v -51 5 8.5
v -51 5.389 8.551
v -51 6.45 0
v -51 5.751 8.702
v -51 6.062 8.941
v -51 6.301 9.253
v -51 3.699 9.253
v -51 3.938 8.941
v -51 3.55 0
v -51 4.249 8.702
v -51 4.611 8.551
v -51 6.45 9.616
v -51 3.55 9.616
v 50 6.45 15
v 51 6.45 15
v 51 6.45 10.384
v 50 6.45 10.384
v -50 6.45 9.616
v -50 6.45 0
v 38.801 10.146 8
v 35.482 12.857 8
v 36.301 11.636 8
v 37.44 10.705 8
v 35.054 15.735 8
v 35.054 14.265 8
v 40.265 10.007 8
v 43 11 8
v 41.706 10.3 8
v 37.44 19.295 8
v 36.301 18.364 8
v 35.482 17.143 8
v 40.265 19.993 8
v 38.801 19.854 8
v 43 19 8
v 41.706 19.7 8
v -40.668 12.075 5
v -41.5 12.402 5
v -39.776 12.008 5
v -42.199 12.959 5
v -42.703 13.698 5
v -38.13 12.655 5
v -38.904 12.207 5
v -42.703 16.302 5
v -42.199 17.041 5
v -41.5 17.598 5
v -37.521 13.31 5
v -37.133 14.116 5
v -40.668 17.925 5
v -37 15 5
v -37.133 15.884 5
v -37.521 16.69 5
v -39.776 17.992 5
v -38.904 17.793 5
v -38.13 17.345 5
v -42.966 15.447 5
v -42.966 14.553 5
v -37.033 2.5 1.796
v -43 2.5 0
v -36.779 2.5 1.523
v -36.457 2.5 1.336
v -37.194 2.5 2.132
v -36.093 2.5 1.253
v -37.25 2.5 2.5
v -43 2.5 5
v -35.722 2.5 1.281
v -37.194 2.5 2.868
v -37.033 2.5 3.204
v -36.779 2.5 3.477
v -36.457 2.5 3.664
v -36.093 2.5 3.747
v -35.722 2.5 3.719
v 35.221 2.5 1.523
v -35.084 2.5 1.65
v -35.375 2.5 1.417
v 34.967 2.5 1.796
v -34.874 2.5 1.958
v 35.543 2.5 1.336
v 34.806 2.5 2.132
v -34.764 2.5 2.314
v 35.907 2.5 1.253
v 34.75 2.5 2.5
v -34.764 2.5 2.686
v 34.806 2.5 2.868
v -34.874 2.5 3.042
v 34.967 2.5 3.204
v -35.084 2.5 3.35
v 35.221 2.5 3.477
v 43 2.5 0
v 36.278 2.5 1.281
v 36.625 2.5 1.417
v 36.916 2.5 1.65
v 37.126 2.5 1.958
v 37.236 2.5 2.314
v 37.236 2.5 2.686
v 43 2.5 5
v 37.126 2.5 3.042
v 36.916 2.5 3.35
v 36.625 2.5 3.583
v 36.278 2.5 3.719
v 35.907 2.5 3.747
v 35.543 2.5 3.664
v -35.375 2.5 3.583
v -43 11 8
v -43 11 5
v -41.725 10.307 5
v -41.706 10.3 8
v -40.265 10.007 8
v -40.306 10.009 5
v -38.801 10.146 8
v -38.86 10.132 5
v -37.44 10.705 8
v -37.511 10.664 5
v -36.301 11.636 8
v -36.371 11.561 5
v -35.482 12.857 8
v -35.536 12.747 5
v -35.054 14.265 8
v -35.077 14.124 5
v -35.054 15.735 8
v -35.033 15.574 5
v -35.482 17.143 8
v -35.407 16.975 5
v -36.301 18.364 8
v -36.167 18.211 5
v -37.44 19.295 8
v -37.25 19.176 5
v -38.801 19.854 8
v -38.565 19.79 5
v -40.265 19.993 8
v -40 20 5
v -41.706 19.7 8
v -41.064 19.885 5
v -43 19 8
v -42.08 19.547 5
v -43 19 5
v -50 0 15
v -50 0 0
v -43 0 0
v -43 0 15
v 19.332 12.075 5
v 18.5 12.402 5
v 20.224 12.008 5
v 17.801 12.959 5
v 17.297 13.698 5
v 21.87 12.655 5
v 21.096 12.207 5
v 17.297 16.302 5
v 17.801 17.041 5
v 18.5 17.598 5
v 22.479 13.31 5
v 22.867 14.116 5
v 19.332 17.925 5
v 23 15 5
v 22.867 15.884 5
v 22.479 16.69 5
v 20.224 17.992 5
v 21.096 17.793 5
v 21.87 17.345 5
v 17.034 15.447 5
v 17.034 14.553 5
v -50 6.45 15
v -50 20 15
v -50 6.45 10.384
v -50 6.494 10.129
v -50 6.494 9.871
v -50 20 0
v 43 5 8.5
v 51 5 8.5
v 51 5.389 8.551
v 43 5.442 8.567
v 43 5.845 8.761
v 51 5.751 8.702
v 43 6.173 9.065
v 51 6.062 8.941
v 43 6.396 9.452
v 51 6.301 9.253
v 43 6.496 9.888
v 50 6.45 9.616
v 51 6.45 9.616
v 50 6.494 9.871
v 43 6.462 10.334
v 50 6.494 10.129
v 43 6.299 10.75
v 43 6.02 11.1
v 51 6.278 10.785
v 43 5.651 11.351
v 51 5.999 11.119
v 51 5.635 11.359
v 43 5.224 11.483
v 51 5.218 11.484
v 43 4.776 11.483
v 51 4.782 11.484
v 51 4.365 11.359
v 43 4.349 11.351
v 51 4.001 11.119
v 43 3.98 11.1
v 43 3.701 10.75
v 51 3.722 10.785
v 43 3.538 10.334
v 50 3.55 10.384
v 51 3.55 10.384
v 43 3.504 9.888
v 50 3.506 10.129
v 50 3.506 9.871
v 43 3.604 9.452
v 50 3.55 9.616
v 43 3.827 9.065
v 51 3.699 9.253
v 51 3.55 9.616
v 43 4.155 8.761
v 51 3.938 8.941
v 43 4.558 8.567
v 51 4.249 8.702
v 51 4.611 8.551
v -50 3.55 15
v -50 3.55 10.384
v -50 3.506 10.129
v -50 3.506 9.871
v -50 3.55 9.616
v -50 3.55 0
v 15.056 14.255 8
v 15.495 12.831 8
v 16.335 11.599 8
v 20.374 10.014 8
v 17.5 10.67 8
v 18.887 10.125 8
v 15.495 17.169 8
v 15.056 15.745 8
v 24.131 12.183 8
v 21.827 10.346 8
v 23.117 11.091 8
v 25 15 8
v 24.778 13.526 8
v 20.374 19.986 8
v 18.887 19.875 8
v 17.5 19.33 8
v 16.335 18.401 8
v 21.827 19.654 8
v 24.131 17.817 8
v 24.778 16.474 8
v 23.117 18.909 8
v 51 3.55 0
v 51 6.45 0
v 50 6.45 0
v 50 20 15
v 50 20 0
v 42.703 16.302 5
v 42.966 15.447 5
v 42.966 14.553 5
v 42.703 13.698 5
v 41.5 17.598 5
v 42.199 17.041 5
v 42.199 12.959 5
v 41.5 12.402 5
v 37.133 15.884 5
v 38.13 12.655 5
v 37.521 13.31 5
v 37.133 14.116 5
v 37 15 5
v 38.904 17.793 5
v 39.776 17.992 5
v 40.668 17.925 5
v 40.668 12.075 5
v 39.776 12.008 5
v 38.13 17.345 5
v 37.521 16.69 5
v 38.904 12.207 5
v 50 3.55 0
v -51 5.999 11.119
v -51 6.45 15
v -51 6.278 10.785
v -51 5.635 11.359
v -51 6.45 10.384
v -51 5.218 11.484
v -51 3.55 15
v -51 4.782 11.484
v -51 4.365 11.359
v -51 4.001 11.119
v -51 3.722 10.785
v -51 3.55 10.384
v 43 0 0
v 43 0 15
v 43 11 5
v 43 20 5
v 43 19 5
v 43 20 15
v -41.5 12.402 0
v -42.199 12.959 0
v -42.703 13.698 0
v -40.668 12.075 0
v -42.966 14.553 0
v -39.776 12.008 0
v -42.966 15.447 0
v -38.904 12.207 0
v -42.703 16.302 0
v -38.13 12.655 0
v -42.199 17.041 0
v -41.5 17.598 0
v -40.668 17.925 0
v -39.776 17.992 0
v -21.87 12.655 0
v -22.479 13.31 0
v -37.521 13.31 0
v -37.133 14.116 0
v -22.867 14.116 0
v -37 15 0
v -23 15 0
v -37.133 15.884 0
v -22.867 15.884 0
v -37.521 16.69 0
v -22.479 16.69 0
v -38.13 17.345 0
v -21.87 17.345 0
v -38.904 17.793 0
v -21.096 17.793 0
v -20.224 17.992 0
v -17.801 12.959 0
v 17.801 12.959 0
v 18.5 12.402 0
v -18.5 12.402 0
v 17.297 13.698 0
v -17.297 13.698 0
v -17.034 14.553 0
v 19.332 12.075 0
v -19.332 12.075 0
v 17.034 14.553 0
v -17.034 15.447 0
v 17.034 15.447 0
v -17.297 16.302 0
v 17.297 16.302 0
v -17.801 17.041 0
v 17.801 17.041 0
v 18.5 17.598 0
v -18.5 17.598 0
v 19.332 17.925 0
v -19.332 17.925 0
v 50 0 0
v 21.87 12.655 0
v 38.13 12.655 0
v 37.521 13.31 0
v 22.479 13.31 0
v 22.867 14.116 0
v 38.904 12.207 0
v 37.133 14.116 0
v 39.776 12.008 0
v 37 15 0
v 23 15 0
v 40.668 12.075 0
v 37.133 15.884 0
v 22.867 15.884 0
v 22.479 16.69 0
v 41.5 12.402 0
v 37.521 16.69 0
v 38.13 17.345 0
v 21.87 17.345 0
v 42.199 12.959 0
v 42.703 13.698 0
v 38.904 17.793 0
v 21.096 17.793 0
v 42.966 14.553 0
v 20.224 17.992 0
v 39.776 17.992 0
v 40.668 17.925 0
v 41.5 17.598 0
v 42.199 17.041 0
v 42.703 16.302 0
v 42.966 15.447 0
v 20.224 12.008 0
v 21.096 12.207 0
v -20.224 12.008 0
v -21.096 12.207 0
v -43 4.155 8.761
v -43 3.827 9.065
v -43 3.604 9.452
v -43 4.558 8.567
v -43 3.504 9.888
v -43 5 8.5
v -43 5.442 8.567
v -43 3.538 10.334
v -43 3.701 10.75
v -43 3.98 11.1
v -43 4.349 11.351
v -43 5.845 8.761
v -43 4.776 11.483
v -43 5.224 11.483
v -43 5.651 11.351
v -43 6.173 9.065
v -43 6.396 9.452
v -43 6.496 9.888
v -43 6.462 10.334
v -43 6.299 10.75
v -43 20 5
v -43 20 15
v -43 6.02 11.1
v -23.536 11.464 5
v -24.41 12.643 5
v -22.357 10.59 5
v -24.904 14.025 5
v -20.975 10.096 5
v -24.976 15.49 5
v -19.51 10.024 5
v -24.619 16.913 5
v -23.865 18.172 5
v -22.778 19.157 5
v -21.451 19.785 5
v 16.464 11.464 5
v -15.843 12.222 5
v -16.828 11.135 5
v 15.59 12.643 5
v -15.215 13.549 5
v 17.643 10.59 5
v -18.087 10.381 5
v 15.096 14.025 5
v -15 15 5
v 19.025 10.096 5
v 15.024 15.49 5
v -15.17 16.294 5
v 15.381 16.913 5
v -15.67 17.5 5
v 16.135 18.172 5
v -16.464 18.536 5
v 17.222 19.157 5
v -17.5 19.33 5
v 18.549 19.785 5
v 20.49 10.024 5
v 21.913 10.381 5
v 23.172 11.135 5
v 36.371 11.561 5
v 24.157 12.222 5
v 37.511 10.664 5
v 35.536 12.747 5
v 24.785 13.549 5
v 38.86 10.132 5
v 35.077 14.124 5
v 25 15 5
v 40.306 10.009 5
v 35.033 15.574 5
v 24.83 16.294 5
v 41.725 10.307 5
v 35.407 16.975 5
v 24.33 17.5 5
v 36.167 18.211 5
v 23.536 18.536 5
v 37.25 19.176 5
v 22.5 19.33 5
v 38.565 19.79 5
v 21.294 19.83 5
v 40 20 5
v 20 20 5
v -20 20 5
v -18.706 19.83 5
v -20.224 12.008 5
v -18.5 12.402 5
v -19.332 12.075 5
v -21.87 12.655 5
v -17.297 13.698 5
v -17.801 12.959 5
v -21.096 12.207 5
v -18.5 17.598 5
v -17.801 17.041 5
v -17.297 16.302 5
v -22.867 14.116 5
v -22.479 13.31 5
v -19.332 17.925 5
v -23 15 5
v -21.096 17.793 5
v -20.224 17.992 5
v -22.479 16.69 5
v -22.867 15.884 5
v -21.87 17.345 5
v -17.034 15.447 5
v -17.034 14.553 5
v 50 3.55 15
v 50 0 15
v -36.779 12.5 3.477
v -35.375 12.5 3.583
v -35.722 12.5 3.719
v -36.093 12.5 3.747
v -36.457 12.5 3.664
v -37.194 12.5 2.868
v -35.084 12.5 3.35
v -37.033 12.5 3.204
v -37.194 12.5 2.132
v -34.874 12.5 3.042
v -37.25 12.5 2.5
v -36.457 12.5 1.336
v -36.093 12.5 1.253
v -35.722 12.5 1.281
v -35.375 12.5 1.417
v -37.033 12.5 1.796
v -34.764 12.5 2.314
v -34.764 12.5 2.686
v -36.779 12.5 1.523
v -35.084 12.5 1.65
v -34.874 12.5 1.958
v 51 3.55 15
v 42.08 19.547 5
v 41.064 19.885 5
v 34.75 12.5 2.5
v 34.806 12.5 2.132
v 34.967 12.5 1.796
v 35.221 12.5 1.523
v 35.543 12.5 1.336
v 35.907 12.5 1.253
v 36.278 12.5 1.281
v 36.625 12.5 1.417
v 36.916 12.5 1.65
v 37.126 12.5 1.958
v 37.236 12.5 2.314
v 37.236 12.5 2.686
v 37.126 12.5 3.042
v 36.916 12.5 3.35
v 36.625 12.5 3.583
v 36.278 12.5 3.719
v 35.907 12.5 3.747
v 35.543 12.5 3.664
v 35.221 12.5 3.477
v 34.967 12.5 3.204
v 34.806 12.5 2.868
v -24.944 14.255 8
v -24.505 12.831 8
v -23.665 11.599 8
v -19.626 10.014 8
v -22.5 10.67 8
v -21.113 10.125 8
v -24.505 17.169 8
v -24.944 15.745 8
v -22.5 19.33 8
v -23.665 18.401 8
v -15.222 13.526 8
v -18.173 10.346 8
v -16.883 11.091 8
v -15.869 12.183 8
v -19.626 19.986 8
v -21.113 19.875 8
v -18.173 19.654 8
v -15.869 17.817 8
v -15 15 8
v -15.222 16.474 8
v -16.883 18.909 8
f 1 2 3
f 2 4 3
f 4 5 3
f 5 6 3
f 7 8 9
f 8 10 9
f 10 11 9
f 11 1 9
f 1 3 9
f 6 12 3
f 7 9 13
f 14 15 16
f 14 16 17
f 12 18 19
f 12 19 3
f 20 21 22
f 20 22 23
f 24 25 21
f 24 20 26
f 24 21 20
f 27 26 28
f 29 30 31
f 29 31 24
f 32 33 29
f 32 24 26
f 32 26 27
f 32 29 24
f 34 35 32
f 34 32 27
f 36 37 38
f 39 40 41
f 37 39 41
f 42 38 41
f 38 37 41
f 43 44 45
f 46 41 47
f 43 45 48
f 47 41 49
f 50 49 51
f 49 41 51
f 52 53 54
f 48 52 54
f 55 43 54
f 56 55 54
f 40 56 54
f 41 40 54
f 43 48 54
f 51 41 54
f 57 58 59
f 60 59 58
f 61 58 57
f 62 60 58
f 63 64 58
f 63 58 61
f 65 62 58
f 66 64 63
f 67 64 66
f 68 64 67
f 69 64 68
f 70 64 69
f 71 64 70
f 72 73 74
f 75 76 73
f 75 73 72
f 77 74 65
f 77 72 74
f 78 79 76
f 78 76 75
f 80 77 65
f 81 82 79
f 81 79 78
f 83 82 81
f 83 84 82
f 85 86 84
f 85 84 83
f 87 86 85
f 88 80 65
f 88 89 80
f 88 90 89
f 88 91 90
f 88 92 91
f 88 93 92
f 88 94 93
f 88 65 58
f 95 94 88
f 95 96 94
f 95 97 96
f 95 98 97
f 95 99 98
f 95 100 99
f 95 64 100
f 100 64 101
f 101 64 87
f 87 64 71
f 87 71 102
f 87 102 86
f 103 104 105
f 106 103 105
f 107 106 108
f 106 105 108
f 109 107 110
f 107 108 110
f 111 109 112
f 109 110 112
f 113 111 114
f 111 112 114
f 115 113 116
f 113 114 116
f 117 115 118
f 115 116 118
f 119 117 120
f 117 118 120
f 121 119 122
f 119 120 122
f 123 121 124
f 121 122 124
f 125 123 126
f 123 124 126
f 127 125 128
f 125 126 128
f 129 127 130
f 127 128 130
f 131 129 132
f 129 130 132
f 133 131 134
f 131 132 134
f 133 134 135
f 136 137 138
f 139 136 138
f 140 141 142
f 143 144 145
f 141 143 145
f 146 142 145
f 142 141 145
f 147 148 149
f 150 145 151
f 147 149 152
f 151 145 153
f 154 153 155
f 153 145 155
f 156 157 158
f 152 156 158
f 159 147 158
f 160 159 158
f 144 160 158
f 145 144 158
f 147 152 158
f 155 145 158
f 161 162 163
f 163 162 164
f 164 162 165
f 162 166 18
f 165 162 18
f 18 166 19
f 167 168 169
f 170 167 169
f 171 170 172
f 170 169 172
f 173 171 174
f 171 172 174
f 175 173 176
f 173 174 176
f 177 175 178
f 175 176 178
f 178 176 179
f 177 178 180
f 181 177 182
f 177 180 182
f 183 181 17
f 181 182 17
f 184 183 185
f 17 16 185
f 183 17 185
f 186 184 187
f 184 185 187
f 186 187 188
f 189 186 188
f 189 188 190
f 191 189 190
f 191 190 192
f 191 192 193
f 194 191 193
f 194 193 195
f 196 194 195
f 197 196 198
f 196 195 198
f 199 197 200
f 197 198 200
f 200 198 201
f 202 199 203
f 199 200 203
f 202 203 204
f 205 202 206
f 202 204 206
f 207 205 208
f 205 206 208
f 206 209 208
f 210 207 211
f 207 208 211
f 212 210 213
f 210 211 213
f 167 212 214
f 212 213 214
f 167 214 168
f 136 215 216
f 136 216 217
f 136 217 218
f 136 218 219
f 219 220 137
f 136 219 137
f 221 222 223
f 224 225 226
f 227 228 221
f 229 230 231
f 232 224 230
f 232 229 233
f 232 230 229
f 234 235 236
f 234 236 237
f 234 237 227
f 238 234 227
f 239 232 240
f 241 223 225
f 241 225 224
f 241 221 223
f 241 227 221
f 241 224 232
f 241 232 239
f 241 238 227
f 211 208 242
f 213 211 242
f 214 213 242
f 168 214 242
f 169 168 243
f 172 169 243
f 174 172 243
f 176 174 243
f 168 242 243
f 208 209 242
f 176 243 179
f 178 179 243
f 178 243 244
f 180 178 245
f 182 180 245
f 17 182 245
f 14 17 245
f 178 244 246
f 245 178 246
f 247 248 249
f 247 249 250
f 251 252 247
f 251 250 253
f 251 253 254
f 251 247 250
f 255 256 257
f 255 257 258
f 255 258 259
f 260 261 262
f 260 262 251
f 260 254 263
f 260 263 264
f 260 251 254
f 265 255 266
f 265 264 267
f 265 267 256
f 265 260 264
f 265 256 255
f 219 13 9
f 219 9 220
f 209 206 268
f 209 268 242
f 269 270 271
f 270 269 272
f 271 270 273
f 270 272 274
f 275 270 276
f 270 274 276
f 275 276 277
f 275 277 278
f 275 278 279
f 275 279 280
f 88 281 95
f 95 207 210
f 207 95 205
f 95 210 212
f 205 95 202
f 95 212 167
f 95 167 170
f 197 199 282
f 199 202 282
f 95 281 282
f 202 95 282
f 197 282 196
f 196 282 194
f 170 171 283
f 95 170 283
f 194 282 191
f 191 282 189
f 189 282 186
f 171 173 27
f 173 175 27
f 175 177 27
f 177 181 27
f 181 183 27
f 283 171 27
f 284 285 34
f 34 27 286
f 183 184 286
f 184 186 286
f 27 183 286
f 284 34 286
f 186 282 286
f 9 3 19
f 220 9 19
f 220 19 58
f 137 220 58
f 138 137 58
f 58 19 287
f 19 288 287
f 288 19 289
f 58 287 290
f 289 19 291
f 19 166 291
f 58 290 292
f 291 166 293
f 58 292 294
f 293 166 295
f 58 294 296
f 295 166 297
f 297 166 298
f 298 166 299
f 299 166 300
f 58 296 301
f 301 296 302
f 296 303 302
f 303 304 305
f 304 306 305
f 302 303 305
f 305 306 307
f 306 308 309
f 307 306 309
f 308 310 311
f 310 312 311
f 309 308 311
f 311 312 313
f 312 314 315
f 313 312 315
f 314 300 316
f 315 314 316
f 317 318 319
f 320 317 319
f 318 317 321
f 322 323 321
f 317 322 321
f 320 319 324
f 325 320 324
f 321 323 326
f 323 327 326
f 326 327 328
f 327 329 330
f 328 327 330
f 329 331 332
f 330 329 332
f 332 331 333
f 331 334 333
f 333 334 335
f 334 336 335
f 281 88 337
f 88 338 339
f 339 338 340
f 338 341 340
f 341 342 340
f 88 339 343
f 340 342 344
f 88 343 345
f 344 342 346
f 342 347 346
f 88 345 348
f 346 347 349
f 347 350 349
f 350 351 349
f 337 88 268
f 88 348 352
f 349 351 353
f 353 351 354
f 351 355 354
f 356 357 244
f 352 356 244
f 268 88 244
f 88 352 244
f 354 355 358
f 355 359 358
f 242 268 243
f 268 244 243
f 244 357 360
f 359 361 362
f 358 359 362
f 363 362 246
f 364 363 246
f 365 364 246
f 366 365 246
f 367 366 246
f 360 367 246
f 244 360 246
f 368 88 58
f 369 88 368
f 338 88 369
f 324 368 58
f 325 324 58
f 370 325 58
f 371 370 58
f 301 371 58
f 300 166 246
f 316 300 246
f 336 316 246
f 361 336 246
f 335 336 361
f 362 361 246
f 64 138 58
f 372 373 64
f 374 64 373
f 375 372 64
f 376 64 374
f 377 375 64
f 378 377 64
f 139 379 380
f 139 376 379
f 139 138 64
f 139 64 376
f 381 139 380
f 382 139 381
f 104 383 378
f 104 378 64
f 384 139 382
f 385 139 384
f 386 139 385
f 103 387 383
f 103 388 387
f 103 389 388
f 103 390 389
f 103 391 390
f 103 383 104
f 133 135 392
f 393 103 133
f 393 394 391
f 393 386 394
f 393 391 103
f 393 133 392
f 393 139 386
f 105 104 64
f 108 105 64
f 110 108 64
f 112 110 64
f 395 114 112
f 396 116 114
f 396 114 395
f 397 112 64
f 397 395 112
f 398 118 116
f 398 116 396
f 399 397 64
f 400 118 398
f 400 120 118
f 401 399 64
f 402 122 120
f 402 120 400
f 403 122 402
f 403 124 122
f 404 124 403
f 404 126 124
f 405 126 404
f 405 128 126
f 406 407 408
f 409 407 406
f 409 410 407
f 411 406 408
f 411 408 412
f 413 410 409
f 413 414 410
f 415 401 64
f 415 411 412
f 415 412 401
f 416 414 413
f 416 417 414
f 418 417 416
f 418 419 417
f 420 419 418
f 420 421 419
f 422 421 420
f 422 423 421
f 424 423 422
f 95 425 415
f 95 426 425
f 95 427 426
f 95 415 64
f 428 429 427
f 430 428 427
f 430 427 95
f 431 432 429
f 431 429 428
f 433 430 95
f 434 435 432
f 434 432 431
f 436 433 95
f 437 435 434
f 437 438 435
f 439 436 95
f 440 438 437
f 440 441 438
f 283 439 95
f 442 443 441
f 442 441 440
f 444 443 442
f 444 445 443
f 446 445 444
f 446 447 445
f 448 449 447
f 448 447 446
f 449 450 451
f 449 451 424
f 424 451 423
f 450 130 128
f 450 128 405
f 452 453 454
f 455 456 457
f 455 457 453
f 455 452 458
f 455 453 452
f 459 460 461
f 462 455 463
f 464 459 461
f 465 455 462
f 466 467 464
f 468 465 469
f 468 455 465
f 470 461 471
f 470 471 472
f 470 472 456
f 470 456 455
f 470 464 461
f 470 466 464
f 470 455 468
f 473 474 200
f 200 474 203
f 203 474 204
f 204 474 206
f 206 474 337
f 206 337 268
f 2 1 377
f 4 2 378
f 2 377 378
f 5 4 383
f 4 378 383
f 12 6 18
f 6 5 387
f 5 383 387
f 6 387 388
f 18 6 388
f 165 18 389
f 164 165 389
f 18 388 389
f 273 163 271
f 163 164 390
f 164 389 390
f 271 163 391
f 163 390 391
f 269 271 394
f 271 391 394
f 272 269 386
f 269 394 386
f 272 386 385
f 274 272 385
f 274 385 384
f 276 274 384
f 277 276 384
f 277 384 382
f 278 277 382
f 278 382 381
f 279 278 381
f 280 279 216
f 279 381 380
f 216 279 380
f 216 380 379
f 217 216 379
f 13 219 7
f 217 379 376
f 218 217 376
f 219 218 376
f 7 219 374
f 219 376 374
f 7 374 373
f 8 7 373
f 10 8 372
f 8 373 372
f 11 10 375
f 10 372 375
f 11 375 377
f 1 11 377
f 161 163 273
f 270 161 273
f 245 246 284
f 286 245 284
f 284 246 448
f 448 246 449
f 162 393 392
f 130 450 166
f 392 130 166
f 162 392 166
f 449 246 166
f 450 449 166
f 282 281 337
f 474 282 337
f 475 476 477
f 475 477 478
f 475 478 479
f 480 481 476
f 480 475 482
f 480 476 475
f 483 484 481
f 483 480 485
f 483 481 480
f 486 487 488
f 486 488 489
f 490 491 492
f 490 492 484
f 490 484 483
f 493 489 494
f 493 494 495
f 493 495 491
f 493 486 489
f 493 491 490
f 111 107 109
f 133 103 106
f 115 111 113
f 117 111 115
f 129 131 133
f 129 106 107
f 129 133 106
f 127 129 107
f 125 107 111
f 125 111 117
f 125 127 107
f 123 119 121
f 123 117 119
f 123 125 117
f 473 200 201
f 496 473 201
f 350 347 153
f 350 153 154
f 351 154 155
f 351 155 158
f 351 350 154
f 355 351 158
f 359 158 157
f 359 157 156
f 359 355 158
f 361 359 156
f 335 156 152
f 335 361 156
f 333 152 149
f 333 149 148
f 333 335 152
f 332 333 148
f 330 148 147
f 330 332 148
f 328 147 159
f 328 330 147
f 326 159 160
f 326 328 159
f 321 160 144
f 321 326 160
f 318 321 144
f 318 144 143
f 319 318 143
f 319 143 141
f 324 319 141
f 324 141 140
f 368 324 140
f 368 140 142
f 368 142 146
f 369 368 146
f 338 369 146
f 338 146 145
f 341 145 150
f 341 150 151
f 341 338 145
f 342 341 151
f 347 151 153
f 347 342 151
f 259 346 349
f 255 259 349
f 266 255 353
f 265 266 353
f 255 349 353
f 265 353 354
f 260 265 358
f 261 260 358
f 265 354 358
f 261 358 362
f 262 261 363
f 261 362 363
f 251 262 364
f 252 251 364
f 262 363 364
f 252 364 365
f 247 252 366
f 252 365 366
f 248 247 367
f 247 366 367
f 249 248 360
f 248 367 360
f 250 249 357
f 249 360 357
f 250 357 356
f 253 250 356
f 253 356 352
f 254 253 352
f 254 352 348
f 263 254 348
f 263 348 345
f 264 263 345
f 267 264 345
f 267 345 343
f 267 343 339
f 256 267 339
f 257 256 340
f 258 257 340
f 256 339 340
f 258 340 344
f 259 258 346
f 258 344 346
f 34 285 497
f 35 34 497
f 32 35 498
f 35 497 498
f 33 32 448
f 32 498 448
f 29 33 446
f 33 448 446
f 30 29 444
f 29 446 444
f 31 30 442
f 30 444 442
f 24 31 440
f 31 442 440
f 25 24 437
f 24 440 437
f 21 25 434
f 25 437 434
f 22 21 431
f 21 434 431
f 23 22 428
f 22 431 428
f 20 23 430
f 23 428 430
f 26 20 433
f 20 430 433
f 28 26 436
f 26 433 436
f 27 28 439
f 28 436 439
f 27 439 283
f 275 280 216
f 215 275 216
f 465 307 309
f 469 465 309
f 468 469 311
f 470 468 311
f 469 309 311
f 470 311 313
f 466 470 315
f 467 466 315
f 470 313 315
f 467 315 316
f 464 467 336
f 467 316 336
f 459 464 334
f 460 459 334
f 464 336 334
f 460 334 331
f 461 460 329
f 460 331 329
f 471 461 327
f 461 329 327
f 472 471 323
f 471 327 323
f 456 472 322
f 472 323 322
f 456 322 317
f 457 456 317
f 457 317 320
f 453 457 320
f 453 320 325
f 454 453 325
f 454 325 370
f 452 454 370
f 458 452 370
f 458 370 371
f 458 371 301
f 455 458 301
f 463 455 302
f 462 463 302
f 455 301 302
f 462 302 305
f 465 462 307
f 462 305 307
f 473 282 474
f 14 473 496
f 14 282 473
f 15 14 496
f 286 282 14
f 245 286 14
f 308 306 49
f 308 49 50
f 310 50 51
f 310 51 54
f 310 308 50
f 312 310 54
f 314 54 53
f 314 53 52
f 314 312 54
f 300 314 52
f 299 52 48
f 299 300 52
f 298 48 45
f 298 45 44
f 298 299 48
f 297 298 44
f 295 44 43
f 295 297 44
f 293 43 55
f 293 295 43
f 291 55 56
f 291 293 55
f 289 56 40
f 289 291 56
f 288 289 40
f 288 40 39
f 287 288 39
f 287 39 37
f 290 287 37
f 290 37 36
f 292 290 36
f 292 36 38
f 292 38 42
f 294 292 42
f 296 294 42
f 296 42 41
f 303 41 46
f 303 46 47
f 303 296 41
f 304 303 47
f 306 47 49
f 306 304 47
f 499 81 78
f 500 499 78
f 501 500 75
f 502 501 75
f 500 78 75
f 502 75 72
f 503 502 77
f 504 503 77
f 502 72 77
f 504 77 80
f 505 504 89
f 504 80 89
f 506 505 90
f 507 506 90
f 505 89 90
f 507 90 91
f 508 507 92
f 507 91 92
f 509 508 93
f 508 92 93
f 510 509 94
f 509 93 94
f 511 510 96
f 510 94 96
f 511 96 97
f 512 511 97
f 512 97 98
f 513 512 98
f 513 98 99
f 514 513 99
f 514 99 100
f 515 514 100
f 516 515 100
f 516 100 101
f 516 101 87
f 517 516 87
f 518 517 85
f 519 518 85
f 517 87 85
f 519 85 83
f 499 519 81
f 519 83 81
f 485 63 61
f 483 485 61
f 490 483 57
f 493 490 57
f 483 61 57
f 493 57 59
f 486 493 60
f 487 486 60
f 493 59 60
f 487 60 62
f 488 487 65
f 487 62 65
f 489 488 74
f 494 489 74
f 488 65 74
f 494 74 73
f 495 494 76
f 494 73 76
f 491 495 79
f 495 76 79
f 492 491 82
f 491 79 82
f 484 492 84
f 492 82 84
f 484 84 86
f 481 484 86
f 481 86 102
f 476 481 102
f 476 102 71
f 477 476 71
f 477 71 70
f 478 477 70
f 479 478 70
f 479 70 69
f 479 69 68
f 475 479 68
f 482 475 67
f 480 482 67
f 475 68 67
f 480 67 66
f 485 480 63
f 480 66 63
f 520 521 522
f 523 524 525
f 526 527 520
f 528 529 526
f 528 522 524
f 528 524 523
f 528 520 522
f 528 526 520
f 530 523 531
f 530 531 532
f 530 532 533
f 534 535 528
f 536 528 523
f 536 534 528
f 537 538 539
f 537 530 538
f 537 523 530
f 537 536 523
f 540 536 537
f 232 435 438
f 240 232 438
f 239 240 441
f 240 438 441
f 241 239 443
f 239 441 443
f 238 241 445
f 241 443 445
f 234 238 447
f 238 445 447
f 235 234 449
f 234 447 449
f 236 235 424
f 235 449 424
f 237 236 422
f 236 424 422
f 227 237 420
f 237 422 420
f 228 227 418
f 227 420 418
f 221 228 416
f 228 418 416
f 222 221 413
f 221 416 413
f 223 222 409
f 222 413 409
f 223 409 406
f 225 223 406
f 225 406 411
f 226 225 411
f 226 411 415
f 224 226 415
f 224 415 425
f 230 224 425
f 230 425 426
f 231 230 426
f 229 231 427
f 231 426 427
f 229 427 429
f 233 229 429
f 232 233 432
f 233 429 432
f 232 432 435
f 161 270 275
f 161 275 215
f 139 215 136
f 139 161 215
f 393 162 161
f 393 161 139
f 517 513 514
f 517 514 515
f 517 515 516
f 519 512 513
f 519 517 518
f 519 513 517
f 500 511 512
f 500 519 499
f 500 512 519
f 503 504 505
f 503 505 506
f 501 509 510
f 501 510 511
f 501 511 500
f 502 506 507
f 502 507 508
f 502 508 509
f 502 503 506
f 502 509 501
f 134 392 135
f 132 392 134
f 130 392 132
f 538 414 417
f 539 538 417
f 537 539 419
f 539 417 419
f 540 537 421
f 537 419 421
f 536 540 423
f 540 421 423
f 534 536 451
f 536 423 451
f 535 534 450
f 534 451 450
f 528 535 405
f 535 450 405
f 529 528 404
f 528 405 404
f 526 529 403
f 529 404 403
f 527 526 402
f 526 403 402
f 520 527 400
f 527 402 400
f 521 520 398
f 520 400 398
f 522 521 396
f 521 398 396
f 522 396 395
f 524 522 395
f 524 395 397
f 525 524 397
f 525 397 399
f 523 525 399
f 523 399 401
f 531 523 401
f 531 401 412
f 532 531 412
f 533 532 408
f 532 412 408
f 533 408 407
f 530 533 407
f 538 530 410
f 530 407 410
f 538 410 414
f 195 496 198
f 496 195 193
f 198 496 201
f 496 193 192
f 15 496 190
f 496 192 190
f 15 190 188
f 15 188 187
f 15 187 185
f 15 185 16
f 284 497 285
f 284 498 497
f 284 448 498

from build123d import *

# Parameters (mm, degrees)
MAIN_DEPTH               = 15
SKETCH2_W                = 86
SKETCH2_H                = 20
TOPEXTRUSION_DEPTH       = 10
SKETCH5_R                = 5
REINFORCEMENTHOLES_DEPTH = 3
SKETCH3_R                = 3
HOLES_DEPTH              = 5
SKETCH4_R                = 1.5
FIXHOLES_DEPTH           = 103
SKETCH6_W                = 86
SKETCH6_H                = 2.5
FORWINDOW_DEPTH          = 6
SKETCH7_R                = 1.25
CUT_EXTRUDE2_DEPTH       = 10


with BuildPart() as part:
    # Sketch1 → Main (new body)
    with BuildSketch(Plane.XY):
        Polygon((-50, 0), (50, 0), (50, 3.55), (51, 3.55), (51, 6.45), (50, 6.45), (50, 20), (-50, 20), (-50, 6.45), (-51, 6.45), (-51, 3.55), (-50, 3.55), align=None)
    extrude(amount=MAIN_DEPTH)

    # Sketch2 → TopExtrusion (cut)
    with BuildSketch(Plane.XY.offset(15)):
        with Locations((0, 10)):
            Rectangle(SKETCH2_W, SKETCH2_H)
    extrude(amount=-TOPEXTRUSION_DEPTH, mode=Mode.SUBTRACT)

    # Sketch5 → ReinforcementHoles (add)
    with BuildSketch(Plane.XY.offset(5)):
        with Locations((-40, 15)):
            Circle(SKETCH5_R)
        with Locations((-20, 15)):
            Circle(SKETCH5_R)
        with Locations((20, 15)):
            Circle(SKETCH5_R)
        with Locations((40, 15)):
            Circle(SKETCH5_R)
    extrude(amount=REINFORCEMENTHOLES_DEPTH)

    # Sketch3 → Holes (cut)
    with BuildSketch(Plane.XY):
        with Locations((-40, 15)):
            Circle(SKETCH3_R)
        with Locations((20, 15)):
            Circle(SKETCH3_R)
    holes = extrude(amount=HOLES_DEPTH, mode=Mode.SUBTRACT)

    # Mirror1: Holes across plane
    add(holes.mirror(Plane(origin=(0, 0, 0), x_dir=(0, 0, 1), z_dir=(1, 0, 0))), mode=Mode.SUBTRACT)

    # Sketch4 → FixHoles (cut, through all)
    with BuildSketch(Plane(origin=(51, 0, 0), x_dir=(0, 0, -1), z_dir=(1, 0, 0))):
        with Locations((-10, 5)):
            Circle(SKETCH4_R)
    extrude(amount=-FIXHOLES_DEPTH, mode=Mode.SUBTRACT)

    # Sketch6 → ForWindow (cut, through all)
    with BuildSketch(Plane.XY.offset(5)):
        with Locations((0, 1.25)):
            Rectangle(SKETCH6_W, SKETCH6_H)
    extrude(amount=-FORWINDOW_DEPTH, mode=Mode.SUBTRACT)

    # Sketch7 → Cut-Extrude2 (cut)
    with BuildSketch(Plane(origin=(0, 2.5, 0), x_dir=(-1, 0, 0), z_dir=(0, -1, 0))):
        with Locations((36, -2.5)):
            Circle(SKETCH7_R)
        with Locations((-36, -2.5)):
            Circle(SKETCH7_R)
    extrude(amount=-CUT_EXTRUDE2_DEPTH, mode=Mode.SUBTRACT)


solid = part.part
